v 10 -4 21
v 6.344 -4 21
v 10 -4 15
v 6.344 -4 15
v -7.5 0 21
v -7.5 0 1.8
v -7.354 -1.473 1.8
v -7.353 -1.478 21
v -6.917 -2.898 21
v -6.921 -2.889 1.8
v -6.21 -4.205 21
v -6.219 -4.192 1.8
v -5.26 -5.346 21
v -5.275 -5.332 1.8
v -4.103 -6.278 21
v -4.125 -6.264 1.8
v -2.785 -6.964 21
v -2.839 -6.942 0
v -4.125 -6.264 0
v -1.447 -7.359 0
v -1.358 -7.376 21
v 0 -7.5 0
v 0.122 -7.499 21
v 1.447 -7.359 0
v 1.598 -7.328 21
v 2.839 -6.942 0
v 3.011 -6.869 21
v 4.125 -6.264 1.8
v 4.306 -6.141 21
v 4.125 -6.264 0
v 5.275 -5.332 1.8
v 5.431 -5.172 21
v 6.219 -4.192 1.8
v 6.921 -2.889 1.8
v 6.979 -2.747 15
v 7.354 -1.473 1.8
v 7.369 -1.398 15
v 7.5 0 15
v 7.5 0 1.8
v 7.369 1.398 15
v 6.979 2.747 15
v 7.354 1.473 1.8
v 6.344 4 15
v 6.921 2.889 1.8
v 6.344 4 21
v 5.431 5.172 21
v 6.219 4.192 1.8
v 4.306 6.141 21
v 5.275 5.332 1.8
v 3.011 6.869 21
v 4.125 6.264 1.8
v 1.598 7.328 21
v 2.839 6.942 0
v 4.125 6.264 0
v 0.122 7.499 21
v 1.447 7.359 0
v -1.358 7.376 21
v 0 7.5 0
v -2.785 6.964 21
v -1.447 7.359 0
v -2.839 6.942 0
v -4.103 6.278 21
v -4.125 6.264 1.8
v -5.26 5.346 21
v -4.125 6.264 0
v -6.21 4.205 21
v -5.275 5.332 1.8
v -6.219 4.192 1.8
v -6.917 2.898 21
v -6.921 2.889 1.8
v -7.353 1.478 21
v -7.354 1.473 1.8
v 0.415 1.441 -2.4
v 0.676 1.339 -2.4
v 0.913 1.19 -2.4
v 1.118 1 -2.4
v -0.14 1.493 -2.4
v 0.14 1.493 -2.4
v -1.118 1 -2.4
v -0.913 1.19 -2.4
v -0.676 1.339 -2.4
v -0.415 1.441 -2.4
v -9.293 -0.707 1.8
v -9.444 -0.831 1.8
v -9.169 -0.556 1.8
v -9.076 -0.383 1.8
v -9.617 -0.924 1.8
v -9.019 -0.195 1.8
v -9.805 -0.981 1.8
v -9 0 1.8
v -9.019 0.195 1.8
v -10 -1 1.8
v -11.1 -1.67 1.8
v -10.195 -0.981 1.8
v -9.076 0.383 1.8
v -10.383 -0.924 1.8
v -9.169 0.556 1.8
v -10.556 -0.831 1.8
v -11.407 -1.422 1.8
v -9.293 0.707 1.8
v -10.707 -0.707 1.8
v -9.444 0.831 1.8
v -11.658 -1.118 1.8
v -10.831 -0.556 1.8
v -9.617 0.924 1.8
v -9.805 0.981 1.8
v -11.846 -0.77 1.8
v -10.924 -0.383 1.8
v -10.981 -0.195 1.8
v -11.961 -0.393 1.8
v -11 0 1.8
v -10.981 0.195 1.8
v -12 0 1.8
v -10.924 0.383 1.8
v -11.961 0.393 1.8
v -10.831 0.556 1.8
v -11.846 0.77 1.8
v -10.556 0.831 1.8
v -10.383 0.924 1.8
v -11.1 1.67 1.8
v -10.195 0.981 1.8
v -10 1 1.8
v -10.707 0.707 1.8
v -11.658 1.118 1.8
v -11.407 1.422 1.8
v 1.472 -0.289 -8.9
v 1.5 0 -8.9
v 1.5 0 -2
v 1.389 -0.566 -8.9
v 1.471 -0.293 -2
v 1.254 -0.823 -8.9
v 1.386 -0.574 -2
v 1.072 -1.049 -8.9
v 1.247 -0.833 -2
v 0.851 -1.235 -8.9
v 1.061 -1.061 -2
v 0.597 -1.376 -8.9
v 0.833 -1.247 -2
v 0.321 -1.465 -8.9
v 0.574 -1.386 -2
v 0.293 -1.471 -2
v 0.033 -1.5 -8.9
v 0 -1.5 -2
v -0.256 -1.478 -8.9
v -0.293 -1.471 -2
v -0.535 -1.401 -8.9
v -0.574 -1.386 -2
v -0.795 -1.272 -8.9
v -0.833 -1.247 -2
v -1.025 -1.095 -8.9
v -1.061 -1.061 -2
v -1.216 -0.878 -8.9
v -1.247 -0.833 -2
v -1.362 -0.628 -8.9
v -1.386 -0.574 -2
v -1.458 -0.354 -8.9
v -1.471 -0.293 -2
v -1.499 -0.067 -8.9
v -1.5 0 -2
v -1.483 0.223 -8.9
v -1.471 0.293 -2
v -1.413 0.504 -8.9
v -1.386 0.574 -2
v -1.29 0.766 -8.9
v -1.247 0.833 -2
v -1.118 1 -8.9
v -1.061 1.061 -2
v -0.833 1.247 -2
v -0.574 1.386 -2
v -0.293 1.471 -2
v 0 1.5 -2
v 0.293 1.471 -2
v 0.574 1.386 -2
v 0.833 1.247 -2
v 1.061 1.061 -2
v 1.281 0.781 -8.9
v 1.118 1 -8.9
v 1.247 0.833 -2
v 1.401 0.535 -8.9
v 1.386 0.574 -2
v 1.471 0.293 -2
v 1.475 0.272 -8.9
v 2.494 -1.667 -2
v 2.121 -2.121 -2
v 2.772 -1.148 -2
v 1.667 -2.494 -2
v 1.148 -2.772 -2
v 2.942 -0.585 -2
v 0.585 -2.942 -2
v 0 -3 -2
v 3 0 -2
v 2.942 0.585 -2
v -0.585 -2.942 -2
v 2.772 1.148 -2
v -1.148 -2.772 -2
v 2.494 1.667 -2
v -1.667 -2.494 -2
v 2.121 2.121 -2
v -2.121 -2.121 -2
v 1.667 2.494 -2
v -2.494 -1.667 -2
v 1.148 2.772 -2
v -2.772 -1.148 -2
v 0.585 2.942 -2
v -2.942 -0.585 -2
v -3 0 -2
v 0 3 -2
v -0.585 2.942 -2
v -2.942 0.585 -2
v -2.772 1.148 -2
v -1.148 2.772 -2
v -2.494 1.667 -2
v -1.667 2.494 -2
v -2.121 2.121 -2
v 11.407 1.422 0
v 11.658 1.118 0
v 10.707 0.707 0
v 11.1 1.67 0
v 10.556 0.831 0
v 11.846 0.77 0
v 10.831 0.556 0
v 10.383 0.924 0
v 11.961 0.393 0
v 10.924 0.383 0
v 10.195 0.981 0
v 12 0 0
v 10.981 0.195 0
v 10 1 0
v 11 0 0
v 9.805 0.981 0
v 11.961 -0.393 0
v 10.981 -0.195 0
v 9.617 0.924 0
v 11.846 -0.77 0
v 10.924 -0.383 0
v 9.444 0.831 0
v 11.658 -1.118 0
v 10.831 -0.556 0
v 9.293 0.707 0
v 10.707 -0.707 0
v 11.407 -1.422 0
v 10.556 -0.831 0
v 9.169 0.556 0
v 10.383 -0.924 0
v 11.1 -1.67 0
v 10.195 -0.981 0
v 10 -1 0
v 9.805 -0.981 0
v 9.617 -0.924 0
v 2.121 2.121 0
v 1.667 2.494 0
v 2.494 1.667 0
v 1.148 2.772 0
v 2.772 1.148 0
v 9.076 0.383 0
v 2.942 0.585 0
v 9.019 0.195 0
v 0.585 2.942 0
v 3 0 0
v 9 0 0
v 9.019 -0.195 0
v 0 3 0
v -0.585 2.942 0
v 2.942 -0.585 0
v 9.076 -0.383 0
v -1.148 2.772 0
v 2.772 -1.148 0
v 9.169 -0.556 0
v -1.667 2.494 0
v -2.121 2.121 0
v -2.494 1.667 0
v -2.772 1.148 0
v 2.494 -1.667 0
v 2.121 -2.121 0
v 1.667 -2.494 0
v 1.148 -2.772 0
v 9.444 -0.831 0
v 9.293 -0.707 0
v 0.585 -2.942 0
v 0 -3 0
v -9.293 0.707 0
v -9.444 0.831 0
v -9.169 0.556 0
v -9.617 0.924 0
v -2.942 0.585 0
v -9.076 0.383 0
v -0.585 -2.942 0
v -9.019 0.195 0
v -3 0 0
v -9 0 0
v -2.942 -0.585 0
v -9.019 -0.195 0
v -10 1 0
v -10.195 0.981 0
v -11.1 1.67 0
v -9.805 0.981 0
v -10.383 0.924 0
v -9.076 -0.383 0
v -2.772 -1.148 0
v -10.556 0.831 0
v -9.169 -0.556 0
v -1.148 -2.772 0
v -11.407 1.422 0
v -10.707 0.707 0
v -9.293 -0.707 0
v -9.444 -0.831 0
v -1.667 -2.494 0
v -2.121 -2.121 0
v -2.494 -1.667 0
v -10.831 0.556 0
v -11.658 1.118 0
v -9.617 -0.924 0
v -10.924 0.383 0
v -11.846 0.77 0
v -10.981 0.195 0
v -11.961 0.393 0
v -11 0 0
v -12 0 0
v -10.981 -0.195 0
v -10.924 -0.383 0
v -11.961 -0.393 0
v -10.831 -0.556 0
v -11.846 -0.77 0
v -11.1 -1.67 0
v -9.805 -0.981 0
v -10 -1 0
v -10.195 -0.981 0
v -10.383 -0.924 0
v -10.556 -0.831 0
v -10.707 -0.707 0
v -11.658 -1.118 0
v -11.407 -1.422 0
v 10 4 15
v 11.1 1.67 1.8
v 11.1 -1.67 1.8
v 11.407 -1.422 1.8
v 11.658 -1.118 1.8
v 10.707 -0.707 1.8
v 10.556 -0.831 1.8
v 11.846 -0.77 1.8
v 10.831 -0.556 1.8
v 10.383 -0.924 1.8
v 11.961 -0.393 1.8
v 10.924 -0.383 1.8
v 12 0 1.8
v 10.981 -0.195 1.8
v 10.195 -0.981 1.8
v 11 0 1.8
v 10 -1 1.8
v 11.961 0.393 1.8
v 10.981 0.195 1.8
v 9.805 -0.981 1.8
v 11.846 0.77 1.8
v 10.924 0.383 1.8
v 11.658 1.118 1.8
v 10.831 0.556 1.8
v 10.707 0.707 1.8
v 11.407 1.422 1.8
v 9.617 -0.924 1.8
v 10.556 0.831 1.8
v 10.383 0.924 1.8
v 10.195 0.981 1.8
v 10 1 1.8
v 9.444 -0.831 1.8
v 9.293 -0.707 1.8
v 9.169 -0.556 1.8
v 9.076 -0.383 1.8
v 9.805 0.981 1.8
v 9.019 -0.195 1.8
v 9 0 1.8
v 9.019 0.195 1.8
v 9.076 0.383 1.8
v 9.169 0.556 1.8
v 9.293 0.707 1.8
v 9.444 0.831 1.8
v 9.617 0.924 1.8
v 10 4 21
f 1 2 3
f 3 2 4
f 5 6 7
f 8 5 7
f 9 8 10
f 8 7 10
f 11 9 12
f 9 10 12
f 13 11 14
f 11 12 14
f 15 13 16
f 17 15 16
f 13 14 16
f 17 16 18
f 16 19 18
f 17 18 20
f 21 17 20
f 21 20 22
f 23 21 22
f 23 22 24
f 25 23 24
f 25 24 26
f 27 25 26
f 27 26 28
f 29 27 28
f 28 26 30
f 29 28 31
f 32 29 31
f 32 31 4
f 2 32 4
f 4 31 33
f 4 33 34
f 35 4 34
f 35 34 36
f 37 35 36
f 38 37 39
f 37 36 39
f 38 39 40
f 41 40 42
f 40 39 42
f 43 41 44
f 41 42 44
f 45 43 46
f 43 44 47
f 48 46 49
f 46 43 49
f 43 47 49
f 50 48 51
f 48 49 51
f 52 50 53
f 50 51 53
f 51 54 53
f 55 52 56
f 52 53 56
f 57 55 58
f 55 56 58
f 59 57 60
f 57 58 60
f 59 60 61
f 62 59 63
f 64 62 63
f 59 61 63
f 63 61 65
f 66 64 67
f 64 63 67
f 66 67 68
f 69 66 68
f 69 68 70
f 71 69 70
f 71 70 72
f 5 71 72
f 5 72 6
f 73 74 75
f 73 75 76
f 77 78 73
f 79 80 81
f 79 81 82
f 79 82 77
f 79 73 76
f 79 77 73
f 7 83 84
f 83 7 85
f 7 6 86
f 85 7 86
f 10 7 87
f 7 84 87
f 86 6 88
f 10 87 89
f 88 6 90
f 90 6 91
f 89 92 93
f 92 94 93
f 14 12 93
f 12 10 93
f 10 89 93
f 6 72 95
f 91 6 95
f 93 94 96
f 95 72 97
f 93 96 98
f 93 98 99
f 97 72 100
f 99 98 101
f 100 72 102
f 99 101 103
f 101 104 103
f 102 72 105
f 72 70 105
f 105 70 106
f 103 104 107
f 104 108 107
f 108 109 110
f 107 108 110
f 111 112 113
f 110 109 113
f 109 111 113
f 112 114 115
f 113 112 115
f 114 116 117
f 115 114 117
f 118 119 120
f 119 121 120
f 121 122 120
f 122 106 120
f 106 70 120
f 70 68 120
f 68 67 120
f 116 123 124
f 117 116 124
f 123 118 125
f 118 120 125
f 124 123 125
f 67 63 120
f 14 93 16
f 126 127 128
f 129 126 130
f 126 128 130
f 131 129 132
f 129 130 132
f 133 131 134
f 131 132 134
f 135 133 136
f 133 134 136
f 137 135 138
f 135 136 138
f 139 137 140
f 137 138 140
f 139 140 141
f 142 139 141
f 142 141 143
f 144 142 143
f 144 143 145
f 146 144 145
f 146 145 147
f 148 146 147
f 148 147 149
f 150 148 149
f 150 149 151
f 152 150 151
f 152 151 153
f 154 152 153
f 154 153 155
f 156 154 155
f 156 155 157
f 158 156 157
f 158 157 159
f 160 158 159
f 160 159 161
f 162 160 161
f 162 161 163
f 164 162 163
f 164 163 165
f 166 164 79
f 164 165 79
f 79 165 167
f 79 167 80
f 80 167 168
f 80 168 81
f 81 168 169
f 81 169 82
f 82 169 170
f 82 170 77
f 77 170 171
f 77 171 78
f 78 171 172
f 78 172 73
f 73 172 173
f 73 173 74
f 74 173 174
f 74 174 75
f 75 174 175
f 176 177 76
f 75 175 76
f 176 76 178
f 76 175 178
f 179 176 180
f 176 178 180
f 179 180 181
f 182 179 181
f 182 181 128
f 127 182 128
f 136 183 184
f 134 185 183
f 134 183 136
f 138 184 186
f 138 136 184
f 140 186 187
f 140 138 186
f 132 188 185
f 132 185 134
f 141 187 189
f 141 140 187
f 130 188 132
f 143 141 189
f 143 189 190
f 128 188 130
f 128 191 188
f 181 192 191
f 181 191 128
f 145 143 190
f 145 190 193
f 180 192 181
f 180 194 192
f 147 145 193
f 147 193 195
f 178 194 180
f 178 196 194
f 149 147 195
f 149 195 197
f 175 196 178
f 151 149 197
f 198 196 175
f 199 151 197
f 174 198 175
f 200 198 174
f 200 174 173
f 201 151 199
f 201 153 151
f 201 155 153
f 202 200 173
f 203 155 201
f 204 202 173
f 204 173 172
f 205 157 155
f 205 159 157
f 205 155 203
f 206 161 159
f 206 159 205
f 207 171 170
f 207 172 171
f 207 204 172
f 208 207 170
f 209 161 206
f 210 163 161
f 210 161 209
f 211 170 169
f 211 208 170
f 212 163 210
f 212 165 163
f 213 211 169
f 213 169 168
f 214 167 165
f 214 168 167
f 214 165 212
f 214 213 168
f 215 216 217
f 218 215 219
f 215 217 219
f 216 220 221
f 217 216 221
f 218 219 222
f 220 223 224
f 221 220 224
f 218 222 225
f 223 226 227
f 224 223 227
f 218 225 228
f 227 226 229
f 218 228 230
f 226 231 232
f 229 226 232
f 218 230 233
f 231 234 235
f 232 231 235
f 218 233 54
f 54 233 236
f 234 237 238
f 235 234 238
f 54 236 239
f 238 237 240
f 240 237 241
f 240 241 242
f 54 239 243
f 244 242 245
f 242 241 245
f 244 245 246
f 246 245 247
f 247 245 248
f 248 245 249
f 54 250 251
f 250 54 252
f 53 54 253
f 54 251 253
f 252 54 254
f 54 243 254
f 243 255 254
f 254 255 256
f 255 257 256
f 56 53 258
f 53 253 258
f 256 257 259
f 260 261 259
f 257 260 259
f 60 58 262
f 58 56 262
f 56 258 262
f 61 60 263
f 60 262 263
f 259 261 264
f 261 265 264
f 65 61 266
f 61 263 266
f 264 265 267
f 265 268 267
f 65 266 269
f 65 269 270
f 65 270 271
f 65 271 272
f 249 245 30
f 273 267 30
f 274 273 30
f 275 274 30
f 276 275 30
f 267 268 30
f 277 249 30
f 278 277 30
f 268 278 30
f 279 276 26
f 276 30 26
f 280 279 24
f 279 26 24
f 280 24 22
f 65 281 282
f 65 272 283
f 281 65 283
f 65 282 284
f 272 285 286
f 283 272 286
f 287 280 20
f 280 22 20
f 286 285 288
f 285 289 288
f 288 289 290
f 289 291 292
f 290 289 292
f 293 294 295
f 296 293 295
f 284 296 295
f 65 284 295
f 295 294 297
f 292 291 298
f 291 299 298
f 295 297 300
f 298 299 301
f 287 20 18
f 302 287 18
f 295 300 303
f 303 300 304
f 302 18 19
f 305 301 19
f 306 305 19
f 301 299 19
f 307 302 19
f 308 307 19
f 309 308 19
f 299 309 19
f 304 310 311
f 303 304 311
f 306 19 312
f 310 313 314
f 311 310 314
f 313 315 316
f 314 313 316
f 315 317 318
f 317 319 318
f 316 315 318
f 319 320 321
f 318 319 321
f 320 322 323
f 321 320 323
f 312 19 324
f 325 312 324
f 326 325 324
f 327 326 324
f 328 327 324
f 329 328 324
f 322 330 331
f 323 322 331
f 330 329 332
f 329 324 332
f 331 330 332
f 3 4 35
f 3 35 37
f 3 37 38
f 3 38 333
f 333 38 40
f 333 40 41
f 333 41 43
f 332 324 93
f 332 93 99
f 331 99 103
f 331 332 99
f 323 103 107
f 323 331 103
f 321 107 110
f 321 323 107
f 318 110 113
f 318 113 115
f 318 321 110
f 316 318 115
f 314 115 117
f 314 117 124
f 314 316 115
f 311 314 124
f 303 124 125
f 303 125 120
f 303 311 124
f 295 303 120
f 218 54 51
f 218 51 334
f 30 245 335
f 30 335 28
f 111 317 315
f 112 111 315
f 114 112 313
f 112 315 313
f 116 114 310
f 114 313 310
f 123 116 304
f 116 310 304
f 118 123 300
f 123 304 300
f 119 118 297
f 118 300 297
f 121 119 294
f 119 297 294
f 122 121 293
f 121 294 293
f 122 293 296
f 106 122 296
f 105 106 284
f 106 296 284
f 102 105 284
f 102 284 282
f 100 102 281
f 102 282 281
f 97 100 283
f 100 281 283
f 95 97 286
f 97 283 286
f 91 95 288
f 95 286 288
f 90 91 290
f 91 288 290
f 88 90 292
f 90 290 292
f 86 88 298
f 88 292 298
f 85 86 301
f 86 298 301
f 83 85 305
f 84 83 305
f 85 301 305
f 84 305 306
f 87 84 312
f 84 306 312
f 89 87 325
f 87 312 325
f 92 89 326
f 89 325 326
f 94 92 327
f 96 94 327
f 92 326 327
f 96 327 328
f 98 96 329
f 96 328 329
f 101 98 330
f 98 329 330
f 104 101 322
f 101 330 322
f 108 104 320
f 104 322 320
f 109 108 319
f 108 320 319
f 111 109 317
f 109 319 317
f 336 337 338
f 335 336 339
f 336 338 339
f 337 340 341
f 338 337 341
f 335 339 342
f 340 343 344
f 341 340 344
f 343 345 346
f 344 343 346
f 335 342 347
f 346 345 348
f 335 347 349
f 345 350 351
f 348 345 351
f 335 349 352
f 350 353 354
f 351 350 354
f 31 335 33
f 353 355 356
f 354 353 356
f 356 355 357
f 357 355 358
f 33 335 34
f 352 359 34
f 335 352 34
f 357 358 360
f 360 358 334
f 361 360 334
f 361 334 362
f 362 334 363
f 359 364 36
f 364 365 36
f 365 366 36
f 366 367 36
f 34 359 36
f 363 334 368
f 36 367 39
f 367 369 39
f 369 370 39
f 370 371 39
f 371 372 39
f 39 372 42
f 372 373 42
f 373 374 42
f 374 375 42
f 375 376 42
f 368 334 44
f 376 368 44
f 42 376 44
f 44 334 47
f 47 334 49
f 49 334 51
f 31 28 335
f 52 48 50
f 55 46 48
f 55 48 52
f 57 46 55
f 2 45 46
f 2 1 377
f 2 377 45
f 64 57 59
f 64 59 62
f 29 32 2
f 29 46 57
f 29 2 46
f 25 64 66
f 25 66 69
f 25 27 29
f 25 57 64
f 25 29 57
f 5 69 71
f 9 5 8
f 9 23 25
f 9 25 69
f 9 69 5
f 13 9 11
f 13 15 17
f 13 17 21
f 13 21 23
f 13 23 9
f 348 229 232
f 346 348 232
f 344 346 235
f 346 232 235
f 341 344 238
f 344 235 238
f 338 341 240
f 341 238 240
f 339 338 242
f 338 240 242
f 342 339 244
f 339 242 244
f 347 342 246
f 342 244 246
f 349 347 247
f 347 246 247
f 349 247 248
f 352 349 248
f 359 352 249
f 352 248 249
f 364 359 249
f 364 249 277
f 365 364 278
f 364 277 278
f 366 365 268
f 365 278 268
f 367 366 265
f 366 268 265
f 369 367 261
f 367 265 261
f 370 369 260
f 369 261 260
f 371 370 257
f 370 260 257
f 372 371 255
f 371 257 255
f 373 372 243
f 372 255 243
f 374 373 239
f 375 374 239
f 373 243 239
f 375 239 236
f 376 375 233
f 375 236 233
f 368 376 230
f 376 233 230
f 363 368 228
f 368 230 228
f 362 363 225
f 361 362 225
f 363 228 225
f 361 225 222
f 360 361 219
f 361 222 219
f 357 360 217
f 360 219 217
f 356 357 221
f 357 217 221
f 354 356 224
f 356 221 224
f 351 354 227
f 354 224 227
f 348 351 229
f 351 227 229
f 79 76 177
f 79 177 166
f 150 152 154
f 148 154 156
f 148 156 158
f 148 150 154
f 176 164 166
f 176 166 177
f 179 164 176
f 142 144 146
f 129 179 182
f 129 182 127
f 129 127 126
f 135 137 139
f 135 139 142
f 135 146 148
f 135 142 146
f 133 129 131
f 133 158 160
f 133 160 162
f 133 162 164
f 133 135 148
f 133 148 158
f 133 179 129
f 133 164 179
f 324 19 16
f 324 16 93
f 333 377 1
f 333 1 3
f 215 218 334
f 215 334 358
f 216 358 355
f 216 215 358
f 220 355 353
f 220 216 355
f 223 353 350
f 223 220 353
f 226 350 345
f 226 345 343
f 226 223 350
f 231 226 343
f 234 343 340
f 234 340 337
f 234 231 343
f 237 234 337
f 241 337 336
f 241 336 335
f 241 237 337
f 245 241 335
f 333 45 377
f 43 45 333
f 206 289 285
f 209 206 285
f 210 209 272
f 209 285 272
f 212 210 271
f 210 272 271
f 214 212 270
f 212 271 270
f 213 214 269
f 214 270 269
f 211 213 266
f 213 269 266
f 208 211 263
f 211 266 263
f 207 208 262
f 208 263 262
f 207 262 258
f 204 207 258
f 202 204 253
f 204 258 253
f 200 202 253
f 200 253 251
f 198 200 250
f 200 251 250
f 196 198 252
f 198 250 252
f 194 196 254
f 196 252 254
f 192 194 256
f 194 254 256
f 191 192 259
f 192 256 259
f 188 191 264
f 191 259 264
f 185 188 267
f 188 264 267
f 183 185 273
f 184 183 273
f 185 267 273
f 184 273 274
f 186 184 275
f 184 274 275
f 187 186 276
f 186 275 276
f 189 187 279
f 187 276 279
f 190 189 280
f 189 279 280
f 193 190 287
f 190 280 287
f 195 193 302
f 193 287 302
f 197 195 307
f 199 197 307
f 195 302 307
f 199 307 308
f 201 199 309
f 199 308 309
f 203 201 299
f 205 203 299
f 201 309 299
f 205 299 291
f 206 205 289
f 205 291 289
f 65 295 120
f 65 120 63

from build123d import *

# Parameters (mm, degrees)
SKETCH_2_R          = 7.5
EXTRUDE_2_DEPTH     = 21
SKETCH_3_R          = 3
EXTRUDE_3_DEPTH     = 2
SKETCH_4_R          = 1.5
EXTRUDE_4_DEPTH     = 6.9
CUT_EXTRUDE_START   = -6.5
CUT_EXTRUDE_1_DEPTH = 6.5
SKETCH_6_R          = 1
EXTRUDE_6_DEPTH     = 1.8
SKETCH_7_W          = 6
SKETCH_7_H          = 8
EXTRUDE_7_DEPTH     = 10


with BuildPart() as part:
    # 草图2 → 凸台-拉伸2 (new body)
    with BuildSketch(Plane.XY):
        with Locations(Location((0, 0, 0), (0, 0, 180))):
            Circle(SKETCH_2_R)
    extrude(amount=EXTRUDE_2_DEPTH)

    # 草图3 → 凸台-拉伸3 (add)
    with BuildSketch(Plane(origin=(0, 0, 0), x_dir=(-1, 0, 0), z_dir=(0, 0, -1))):
        Circle(SKETCH_3_R)
    extrude(amount=EXTRUDE_3_DEPTH)

    # 草图4 → 凸台-拉伸4 (add)
    with BuildSketch(Plane(origin=(0, 0, -2), x_dir=(-1, 0, 0), z_dir=(0, 0, -1))):
        with Locations(Location((0, 0, 0), (0, 0, 180))):
            Circle(SKETCH_4_R)
    extrude(amount=EXTRUDE_4_DEPTH)

    # 草图5 → 切除-拉伸1 (cut)
    with BuildSketch(Plane(origin=(0, 0, -8.9), x_dir=(-1, 0, 0), z_dir=(0, 0, -1)).offset(CUT_EXTRUDE_START)):
        with BuildLine():
            Line((-1.118033989, 1), (1.118033989, 1))
            ThreePointArc((1.118033989, 1), (0, 1.5), (-1.118033989, 1))
        make_face()
    extrude(amount=CUT_EXTRUDE_1_DEPTH, mode=Mode.SUBTRACT)

    # 草图6 → 凸台-拉伸6 (add)
    with BuildSketch(Plane(origin=(0, 0, 0), x_dir=(-1, 0, 0), z_dir=(0, 0, -1))):
        with BuildLine():
            Line((11.1, 1.670329309), (4.125, 6.263734908))
            ThreePointArc((4.125, 6.263734908), (0, 7.5), (-4.125, 6.263734908))
            Line((-4.125, 6.263734908), (-11.1, 1.670329309))
            ThreePointArc((-11.1, 1.670329309), (-12, 0), (-11.1, -1.670329309))
            Line((-11.1, -1.670329309), (-4.125, -6.263734908))
            ThreePointArc((-4.125, -6.263734908), (0, -7.5), (4.125, -6.263734908))
            Line((4.125, -6.263734908), (11.1, -1.670329309))
            ThreePointArc((11.1, -1.670329309), (12, 0), (11.1, 1.670329309))
        make_face()
        with Locations((10, 0)):
            Circle(SKETCH_6_R, mode=Mode.SUBTRACT)
        with Locations(Location((-10, 0, 0), (0, 0, 180))):
            Circle(SKETCH_6_R, mode=Mode.SUBTRACT)
    extrude(amount=-EXTRUDE_6_DEPTH)

    # 草图7 → 凸台-拉伸7 (add)
    with BuildSketch(Plane(origin=(0, 0, 0), x_dir=(0, 0, -1), z_dir=(1, 0, 0))):
        with Locations((-18, 0)):
            Rectangle(SKETCH_7_W, SKETCH_7_H)
    extrude(amount=EXTRUDE_7_DEPTH)


solid = part.part
